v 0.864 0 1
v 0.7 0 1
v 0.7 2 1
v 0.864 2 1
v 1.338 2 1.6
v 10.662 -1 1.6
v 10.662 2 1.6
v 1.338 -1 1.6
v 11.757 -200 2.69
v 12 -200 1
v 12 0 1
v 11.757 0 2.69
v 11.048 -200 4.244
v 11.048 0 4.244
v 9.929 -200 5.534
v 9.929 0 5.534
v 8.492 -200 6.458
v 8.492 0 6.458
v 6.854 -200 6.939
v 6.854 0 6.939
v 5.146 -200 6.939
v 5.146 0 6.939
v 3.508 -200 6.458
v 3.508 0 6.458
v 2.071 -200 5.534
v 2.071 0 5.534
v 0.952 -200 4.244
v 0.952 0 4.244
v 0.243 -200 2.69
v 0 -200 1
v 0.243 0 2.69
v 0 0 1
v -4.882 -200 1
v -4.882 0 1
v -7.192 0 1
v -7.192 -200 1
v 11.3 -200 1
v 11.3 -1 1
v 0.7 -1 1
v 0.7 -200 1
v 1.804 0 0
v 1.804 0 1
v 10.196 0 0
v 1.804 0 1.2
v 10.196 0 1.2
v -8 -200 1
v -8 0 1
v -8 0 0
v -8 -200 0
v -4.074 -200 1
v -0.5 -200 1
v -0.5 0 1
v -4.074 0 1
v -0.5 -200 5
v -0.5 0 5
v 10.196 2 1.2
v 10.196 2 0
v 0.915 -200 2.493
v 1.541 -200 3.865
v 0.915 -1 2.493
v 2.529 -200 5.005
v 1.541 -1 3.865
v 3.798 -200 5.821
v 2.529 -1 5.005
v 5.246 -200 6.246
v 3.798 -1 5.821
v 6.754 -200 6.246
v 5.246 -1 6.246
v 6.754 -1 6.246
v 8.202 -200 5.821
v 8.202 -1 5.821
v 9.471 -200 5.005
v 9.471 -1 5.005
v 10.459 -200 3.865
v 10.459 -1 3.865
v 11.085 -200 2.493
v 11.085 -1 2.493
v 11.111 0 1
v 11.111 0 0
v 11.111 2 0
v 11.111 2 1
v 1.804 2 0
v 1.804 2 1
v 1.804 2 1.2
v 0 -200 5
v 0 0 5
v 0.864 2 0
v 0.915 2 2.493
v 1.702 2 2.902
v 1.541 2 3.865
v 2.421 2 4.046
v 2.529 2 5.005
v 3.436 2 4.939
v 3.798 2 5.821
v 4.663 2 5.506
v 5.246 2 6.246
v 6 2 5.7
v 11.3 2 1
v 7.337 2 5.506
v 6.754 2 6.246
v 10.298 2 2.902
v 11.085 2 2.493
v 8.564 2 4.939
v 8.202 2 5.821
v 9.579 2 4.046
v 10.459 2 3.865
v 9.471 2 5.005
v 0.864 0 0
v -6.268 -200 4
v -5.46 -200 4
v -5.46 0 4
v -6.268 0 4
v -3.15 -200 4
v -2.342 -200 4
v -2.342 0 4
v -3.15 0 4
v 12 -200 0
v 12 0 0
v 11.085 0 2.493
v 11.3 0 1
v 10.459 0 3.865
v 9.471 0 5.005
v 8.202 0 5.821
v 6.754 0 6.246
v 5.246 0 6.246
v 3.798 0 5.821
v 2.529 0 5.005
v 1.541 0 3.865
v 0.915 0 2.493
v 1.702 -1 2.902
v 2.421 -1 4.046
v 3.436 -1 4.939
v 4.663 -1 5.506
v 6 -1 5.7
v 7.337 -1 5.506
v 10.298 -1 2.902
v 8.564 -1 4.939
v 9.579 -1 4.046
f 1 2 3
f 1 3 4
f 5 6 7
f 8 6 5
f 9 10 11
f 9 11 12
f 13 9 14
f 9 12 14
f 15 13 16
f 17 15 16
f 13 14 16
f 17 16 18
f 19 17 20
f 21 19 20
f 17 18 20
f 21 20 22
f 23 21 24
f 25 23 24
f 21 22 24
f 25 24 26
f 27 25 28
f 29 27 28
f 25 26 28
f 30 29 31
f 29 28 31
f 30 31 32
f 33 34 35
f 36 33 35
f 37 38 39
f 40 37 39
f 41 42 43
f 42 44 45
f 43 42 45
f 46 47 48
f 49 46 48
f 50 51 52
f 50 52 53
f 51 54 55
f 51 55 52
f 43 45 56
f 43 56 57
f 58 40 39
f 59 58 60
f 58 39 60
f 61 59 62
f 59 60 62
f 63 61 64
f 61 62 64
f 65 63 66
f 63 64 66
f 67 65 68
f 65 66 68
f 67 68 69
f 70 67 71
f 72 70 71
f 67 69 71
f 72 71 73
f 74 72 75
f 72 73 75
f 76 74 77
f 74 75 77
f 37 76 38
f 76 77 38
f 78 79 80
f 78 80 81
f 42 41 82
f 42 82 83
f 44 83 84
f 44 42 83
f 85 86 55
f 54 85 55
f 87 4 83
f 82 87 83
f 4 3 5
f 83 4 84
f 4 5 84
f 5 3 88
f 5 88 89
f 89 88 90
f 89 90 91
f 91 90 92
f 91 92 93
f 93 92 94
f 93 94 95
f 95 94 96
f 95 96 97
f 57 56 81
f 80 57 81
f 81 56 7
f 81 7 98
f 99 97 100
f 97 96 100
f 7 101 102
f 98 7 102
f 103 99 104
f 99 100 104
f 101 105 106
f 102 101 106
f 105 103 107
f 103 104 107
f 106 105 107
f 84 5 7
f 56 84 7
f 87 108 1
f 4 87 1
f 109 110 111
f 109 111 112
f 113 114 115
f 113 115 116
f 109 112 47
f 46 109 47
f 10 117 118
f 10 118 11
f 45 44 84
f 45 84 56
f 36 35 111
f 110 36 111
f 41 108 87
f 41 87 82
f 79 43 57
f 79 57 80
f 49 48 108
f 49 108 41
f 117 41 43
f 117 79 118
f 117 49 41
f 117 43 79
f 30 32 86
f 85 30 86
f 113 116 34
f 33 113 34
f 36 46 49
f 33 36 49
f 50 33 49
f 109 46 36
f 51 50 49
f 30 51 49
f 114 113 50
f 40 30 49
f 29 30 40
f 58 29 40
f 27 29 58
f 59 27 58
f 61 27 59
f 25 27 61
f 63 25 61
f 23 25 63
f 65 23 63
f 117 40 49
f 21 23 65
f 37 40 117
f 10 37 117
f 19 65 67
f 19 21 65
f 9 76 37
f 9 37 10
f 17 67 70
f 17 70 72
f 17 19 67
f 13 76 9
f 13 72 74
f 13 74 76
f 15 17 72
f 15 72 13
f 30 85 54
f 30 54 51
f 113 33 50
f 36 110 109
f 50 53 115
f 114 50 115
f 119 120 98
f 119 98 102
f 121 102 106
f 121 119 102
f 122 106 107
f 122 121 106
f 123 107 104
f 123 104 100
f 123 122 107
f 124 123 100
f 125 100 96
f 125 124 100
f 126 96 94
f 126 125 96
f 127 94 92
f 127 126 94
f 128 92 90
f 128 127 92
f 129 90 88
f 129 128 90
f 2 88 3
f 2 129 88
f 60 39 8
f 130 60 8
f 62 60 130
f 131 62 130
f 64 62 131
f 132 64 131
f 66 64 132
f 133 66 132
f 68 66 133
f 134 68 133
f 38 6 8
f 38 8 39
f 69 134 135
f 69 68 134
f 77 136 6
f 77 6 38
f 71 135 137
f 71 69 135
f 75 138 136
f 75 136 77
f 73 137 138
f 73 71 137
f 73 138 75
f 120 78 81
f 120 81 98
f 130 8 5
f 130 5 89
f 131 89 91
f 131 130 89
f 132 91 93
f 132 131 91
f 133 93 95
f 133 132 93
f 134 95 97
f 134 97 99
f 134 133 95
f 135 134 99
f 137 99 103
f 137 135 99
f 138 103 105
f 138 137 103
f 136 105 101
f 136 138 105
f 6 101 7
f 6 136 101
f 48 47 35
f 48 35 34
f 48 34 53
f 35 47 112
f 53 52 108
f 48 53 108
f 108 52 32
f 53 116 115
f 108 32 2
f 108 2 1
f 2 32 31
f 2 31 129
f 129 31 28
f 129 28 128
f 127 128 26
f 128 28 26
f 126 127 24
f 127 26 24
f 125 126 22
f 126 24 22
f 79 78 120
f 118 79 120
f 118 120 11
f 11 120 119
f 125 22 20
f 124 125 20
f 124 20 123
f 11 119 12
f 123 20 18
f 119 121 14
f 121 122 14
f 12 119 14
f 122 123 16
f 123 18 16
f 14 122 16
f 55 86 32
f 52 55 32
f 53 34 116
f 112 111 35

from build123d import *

# Parameters (mm, degrees)
F1_DEPTH = 200
F2_W     = 8.3923048454
F2_H     = 0.2
F3_DEPTH = 1
F2_W_2   = 0.9144346228
F2_H_2   = 1
F2_W_3   = 0.9401379739
F4_DEPTH = 2


with BuildPart() as f1:
    # F0 (on Front) → F1 (new body)
    with BuildSketch(Plane.XZ):
        with BuildLine():
            Line((-8, 0), (0, 0))
            Line((0, 0), (12, 0))
            Line((12, 0), (12, 1))
            ThreePointArc((12, 1), (6, 7), (0, 1))
            Line((0, 1), (0, 5))
            Line((0, 5), (-0.5, 5))
            Line((-0.5, 5), (-0.5, 1))
            Line((-0.5, 1), (-4.0740181695, 1))
            Line((-4.0740181695, 1), (-2.3419673619, 4))
            Line((-2.3419673619, 4), (-3.1502577388, 4))
            Line((-3.1502577388, 4), (-4.8823085464, 1))
            Line((-4.8823085464, 1), (-7.1917096231, 1))
            Line((-7.1917096231, 1), (-5.4596588156, 4))
            Line((-5.4596588156, 4), (-6.2679491924, 4))
            Line((-6.2679491924, 4), (-8, 1))
            Line((-8, 1), (-8, 0))
        make_face()
        with BuildLine():
            ThreePointArc((0.7, 1), (6, 6.3), (11.3, 1))
            Line((11.3, 1), (0.7, 1))
        make_face(mode=Mode.SUBTRACT)
    extrude(amount=F1_DEPTH)

    # F2 (on Front) → F3 (join)
    with BuildSketch(Plane.XZ):
        with BuildLine():
            ThreePointArc((0.9039230775, 1.2), (6, 6.1), (11.0960769225, 1.2))
            Line((11.0960769225, 1.2), (10.1961524227, 1.2))
            Line((10.1961524227, 1.2), (10.1961524227, 1))
            Line((10.1961524227, 1), (11.1105870456, 1))
            Line((11.1105870456, 1), (11.3, 1))
            ThreePointArc((11.3, 1), (6, 6.3), (0.7, 1))
            Line((0.7, 1), (0.8637096034, 1))
            Line((0.8637096034, 1), (1.8038475773, 1))
            Line((1.8038475773, 1), (1.8038475773, 1.2))
            Line((1.8038475773, 1.2), (0.9039230775, 1.2))
        make_face()
        with BuildLine():
            Line((10.1961524227, 1.2), (11.0960769225, 1.2))
            ThreePointArc((11.0960769225, 1.2), (6, 6.1), (0.9039230775, 1.2))
            Line((0.9039230775, 1.2), (1.8038475773, 1.2))
            Line((1.8038475773, 1.2), (10.1961524227, 1.2))
        make_face()
        with BuildLine():
            ThreePointArc((1.3384551917, 1.6), (6, 5.7), (10.6615448083, 1.6))
            Line((10.6615448083, 1.6), (1.3384551917, 1.6))
        make_face(mode=Mode.SUBTRACT)
        with Locations((6, 1.1)):
            Rectangle(F2_W, F2_H)
    extrude(amount=F3_DEPTH)

    # F2 (on Front) → F4 (join)
    with BuildSketch(Plane.XZ):
        with BuildLine():
            Line((10.1961524227, 1.2), (11.0960769225, 1.2))
            ThreePointArc((11.0960769225, 1.2), (6, 6.1), (0.9039230775, 1.2))
            Line((0.9039230775, 1.2), (1.8038475773, 1.2))
            Line((1.8038475773, 1.2), (10.1961524227, 1.2))
        make_face()
        with BuildLine():
            ThreePointArc((1.3384551917, 1.6), (6, 5.7), (10.6615448083, 1.6))
            Line((10.6615448083, 1.6), (1.3384551917, 1.6))
        make_face(mode=Mode.SUBTRACT)
        with Locations((10.6533697341, 0.5)):
            Rectangle(F2_W_2, F2_H_2)
        with Locations((1.3337785904, 0.5)):
            Rectangle(F2_W_3, F2_H_2)
        with BuildLine():
            ThreePointArc((0.9039230775, 1.2), (6, 6.1), (11.0960769225, 1.2))
            Line((11.0960769225, 1.2), (10.1961524227, 1.2))
            Line((10.1961524227, 1.2), (10.1961524227, 1))
            Line((10.1961524227, 1), (11.1105870456, 1))
            Line((11.1105870456, 1), (11.3, 1))
            ThreePointArc((11.3, 1), (6, 6.3), (0.7, 1))
            Line((0.7, 1), (0.8637096034, 1))
            Line((0.8637096034, 1), (1.8038475773, 1))
            Line((1.8038475773, 1), (1.8038475773, 1.2))
            Line((1.8038475773, 1.2), (0.9039230775, 1.2))
        make_face()
    extrude(amount=-F4_DEPTH)


solid = f1.part
